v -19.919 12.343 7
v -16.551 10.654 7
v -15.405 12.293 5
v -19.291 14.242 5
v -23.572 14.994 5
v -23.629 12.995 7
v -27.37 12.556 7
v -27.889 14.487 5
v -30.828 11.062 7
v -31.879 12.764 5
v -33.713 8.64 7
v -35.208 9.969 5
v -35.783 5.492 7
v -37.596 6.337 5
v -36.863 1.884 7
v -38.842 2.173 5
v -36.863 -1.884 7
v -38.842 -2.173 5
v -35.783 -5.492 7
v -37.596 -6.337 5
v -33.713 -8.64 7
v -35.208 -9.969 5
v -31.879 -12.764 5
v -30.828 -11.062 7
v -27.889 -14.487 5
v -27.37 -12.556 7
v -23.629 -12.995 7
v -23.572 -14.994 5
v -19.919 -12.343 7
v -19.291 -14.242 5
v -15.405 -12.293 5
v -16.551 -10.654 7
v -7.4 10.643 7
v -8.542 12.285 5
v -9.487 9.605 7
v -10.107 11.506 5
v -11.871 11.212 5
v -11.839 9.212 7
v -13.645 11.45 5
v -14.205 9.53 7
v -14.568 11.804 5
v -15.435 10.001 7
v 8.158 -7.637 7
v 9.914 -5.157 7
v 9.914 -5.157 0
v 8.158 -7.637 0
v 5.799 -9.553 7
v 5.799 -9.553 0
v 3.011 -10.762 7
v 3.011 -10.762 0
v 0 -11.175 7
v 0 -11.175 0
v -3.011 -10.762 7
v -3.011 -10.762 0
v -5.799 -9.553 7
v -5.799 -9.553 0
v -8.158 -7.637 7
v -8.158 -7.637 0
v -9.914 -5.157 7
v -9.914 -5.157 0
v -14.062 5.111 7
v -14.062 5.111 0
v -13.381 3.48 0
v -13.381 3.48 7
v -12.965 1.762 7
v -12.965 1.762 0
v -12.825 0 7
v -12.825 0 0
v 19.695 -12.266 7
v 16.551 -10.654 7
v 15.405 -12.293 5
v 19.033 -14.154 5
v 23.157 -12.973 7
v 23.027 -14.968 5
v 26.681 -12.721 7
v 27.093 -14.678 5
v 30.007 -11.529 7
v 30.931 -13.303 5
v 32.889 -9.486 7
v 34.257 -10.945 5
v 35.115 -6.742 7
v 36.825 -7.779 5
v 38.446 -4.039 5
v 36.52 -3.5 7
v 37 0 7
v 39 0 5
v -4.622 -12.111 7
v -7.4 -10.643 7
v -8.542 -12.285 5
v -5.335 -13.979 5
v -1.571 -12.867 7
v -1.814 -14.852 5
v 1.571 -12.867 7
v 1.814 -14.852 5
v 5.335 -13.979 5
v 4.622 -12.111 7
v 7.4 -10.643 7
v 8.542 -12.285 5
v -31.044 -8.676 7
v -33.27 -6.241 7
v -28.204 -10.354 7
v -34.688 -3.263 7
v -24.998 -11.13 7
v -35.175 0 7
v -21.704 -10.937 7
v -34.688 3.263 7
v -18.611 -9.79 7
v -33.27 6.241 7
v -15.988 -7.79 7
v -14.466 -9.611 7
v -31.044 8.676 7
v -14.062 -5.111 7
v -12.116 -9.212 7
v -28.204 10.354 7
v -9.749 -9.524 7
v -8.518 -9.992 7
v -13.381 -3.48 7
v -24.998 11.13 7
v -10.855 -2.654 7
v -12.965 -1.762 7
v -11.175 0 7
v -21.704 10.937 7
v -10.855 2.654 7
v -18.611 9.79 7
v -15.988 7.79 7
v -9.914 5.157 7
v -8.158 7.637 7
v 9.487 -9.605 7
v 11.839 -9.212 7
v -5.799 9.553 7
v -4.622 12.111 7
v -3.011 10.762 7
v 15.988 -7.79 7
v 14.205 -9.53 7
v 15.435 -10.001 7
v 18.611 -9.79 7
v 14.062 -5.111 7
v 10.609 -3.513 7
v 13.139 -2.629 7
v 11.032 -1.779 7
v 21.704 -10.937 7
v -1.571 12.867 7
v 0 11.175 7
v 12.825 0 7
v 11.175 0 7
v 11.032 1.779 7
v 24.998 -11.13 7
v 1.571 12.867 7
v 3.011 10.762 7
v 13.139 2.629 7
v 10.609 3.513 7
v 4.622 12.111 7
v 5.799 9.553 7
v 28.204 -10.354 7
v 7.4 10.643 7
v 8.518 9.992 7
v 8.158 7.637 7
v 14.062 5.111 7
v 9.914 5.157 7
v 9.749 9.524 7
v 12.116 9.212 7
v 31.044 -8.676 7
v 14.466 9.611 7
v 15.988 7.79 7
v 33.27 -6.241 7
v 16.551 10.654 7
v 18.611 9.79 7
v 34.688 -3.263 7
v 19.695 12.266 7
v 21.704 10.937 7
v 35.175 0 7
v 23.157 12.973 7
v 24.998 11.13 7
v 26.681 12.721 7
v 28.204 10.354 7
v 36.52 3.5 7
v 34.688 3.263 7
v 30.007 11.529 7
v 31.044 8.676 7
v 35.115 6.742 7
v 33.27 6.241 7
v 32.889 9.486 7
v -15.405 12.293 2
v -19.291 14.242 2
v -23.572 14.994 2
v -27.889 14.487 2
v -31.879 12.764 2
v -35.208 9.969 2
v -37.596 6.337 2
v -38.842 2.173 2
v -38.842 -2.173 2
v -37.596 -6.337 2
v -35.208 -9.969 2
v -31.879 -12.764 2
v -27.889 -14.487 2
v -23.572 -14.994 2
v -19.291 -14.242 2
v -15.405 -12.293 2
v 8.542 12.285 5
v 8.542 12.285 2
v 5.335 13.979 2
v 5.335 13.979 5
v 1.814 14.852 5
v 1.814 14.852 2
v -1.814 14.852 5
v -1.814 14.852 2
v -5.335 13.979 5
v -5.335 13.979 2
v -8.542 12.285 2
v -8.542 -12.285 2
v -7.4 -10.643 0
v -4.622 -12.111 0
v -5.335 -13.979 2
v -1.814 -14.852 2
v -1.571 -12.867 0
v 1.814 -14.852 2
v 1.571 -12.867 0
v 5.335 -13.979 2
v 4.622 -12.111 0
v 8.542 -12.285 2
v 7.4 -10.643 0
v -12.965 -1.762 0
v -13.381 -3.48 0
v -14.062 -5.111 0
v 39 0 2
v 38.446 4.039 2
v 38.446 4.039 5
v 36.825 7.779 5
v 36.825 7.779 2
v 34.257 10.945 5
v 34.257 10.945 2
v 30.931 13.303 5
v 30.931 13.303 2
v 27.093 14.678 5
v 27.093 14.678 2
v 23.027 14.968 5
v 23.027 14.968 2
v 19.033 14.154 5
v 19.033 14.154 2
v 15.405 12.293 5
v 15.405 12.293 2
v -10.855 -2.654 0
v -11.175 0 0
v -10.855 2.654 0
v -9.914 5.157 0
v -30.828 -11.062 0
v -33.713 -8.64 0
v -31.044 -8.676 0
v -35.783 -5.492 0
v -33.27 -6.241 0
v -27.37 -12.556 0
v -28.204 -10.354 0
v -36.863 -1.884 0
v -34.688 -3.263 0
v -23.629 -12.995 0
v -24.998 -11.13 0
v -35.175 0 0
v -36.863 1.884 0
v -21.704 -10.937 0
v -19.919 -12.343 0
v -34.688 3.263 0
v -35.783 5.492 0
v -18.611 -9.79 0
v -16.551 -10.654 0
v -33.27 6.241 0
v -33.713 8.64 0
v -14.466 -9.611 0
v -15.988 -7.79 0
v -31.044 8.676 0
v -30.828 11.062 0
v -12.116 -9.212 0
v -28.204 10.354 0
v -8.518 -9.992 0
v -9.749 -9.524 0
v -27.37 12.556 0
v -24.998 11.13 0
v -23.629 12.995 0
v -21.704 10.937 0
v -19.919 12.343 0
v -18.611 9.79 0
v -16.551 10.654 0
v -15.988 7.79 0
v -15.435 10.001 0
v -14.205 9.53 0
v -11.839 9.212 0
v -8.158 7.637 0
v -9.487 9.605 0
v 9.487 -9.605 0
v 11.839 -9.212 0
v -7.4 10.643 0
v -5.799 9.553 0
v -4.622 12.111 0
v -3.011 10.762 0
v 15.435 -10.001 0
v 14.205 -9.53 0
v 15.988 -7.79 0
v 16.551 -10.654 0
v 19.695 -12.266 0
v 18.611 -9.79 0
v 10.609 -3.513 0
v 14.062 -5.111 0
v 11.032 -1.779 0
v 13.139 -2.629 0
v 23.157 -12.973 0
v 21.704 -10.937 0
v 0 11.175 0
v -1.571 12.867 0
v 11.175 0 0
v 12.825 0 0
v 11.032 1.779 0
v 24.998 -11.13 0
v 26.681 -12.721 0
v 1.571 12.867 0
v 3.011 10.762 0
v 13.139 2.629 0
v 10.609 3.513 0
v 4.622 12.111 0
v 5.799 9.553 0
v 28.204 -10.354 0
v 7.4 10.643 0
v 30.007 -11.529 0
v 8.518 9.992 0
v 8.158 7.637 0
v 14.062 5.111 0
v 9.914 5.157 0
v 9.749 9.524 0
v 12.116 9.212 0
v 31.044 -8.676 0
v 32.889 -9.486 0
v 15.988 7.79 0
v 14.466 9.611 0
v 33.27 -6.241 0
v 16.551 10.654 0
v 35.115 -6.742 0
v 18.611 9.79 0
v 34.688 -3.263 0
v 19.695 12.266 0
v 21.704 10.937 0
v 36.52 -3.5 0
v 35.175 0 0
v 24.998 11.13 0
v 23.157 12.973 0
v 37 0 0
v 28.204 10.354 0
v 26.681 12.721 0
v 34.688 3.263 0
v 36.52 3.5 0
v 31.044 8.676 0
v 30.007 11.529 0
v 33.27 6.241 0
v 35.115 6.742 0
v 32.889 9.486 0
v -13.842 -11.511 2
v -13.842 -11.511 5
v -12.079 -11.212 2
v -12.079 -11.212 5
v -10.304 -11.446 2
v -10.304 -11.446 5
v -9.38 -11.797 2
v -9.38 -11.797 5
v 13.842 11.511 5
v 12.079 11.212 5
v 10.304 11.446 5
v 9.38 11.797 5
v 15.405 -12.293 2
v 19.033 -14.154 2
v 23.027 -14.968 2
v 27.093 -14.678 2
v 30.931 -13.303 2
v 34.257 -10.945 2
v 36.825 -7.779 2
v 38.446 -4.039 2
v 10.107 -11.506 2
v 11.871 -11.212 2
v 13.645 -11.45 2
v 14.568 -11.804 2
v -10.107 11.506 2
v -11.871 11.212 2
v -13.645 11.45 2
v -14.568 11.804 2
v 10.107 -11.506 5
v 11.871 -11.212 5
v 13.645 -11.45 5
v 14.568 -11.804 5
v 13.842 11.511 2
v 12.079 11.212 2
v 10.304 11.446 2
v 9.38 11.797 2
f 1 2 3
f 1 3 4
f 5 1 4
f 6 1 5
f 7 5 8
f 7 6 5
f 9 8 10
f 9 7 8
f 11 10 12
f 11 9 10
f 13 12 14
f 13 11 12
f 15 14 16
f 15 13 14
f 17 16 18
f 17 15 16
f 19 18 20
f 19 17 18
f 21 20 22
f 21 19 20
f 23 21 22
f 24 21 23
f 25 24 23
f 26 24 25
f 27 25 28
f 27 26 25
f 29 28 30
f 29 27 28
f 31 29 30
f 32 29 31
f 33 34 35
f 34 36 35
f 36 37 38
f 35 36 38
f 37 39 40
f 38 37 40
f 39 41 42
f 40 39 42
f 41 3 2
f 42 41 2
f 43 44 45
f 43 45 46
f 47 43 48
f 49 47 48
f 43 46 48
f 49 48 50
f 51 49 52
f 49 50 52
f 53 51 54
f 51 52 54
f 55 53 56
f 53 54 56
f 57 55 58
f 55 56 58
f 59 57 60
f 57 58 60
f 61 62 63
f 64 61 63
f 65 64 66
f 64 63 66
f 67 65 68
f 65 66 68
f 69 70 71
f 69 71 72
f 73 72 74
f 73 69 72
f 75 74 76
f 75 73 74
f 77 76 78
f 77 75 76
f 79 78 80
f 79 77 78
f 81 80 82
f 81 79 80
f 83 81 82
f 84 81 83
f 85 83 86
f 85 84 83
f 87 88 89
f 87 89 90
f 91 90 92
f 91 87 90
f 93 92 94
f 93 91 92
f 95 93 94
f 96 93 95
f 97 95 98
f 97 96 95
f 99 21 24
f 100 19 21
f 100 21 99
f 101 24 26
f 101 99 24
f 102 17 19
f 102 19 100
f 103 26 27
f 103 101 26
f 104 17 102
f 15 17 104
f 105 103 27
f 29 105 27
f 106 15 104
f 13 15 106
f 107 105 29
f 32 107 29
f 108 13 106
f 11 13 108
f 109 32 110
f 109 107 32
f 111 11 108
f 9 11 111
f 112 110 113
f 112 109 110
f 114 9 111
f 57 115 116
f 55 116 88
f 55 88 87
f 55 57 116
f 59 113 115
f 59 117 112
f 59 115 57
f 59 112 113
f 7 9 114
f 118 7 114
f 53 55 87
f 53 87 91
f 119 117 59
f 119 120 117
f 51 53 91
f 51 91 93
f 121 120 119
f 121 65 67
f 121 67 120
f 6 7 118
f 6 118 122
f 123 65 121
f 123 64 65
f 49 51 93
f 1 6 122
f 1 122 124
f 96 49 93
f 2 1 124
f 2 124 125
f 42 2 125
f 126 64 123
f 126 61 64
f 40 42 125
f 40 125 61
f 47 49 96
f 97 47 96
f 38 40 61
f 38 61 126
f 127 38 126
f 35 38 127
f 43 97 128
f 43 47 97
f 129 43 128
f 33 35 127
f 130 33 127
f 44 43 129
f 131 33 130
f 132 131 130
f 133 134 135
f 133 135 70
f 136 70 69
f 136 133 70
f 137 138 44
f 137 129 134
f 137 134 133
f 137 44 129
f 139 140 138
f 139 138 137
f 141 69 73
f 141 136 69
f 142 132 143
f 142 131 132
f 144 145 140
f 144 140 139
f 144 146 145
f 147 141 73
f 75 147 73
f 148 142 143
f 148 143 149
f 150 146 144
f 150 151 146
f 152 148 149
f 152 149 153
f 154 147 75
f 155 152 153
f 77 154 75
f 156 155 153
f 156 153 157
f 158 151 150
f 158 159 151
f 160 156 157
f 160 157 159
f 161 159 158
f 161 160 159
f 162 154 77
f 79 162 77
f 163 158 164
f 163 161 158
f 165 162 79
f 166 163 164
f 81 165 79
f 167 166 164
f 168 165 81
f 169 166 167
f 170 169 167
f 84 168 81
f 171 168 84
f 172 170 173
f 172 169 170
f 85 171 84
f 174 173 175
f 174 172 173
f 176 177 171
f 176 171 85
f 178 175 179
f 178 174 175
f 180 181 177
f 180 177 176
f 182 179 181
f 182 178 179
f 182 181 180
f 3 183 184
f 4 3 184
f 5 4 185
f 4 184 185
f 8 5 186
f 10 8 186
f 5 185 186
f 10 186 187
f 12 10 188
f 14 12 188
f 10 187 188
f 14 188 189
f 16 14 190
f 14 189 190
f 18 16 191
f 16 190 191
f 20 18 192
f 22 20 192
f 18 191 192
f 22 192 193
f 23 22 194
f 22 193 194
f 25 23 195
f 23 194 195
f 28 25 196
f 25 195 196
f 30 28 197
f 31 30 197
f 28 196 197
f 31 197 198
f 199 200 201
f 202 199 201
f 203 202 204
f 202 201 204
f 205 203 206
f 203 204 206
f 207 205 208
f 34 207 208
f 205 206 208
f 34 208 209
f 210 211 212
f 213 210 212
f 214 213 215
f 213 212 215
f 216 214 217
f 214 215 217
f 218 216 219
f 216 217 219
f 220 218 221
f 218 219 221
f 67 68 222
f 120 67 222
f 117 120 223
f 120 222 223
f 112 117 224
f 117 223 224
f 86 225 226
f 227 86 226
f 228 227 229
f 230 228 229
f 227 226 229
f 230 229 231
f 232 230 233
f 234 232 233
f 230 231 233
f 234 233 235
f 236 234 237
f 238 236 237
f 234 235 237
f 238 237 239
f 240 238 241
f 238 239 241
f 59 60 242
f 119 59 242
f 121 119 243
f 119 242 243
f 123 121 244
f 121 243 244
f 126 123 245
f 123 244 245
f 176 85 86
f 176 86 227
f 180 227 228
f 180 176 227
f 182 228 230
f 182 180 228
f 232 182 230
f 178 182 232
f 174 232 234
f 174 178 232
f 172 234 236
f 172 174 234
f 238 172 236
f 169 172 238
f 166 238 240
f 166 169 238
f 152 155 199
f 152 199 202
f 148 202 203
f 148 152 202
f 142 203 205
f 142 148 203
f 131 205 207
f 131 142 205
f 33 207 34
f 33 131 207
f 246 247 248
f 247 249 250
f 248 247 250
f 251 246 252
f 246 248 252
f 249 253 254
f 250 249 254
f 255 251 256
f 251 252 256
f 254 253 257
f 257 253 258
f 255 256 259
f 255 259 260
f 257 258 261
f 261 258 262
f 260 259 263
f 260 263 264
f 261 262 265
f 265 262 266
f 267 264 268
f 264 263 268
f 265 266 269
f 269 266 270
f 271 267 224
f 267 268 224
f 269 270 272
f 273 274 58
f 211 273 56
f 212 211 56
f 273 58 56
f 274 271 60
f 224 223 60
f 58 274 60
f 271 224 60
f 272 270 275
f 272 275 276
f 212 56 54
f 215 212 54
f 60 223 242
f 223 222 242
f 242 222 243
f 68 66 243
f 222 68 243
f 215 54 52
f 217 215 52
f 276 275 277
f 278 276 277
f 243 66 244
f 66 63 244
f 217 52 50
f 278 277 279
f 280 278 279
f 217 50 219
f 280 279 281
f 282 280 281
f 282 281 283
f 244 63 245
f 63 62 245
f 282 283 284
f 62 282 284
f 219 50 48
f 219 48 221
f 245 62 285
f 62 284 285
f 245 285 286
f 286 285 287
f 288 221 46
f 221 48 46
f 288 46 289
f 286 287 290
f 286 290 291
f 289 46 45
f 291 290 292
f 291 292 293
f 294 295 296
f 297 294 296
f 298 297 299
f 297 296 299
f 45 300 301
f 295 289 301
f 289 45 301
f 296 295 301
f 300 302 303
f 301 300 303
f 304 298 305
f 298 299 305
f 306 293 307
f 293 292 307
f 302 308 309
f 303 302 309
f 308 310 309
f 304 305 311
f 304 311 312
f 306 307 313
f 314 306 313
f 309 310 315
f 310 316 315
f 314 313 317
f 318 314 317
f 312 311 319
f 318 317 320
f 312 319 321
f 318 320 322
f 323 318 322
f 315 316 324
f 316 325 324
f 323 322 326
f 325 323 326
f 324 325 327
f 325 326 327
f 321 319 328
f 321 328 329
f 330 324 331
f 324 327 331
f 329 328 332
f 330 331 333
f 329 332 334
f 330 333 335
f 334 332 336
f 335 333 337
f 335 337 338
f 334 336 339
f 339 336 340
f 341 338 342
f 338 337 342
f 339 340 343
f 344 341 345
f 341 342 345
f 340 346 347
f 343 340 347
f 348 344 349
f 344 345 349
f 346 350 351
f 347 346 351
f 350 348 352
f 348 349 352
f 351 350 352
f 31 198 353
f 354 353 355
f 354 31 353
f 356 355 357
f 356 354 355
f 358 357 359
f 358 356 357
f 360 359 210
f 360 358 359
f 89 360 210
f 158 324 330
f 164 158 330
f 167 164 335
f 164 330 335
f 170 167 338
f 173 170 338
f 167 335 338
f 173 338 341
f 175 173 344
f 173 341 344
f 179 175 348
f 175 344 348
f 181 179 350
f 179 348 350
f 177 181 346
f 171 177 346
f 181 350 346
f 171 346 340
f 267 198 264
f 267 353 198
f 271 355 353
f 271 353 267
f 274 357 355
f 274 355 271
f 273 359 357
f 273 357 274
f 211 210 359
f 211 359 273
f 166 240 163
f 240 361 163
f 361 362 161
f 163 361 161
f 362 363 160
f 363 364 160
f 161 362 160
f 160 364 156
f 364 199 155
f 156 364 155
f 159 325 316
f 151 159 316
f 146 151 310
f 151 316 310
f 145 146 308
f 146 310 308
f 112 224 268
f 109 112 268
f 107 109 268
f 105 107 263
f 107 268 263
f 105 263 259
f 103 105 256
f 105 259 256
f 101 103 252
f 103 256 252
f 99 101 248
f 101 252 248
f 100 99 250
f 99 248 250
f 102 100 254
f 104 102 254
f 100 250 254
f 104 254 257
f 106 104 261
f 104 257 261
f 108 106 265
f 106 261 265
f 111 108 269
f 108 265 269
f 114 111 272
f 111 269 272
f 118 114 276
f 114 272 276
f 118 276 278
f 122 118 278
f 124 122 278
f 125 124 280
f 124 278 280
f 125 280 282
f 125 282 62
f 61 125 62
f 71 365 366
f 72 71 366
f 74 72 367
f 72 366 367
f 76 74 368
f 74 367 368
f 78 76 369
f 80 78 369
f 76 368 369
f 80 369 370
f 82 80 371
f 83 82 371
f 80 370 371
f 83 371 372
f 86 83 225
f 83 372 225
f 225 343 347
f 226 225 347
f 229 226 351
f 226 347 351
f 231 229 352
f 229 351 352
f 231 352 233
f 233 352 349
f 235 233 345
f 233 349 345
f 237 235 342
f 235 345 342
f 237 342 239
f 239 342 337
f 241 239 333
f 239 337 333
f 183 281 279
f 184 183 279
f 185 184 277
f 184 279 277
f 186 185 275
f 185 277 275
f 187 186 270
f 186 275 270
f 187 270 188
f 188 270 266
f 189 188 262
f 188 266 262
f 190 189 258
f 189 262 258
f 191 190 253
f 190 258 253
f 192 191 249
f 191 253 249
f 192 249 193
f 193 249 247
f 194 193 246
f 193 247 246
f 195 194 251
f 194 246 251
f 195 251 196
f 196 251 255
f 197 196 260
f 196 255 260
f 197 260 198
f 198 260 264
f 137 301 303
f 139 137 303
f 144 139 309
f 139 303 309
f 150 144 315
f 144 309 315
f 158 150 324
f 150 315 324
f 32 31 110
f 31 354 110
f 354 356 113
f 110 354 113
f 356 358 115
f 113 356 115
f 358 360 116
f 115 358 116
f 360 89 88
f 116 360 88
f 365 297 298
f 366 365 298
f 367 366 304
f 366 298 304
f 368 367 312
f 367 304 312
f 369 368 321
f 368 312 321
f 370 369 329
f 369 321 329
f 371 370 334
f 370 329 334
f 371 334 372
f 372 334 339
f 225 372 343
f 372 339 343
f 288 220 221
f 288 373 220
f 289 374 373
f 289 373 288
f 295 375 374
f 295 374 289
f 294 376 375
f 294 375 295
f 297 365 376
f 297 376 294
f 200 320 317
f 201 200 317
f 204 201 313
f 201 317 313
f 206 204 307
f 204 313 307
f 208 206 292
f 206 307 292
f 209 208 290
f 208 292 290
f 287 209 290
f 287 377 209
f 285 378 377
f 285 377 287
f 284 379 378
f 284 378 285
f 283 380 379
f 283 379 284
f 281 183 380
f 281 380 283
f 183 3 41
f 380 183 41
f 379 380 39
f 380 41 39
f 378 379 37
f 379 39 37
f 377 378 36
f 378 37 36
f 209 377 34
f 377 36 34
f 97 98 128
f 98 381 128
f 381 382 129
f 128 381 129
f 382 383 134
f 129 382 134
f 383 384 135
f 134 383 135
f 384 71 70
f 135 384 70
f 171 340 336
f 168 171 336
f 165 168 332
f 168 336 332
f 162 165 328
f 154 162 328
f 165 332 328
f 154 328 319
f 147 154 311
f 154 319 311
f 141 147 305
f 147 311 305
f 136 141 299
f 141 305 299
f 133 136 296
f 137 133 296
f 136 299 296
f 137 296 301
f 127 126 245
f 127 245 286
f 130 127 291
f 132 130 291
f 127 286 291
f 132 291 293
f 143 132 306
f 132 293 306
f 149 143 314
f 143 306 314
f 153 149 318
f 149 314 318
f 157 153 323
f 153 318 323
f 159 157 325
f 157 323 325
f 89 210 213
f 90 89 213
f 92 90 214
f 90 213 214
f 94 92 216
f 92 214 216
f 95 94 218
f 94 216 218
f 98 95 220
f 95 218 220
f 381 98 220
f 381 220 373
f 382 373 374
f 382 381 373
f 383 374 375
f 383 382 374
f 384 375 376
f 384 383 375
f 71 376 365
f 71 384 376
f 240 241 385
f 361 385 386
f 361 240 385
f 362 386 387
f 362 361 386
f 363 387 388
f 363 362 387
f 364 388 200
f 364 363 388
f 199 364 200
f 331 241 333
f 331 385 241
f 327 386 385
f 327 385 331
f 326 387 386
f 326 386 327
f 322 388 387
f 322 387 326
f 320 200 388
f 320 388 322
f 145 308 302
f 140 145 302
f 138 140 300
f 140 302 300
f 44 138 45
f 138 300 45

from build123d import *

# Parameters (mm, degrees)
F1_DEPTH = 7
F2_R     = 6
F3_SIZE  = 2


# Not quite as in the source:
# - a feature names something its author has since deleted; it is built from what else it names


with BuildPart() as f1:
    # F0 (on Top) → F1 (new body)
    with BuildSketch(Plane.XY):
        with BuildLine():
            ThreePointArc((-14.0623969756, 5.1112299037), (-13.1615738007, 7.1167868393), (-11.9765766631, 8.9686839202))
            ThreePointArc((-11.9765766631, 8.9686839202), (-39, 0), (-11.9765766631, -8.9686839202))
            ThreePointArc((-11.9765766631, -8.9686839202), (-13.1615738007, -7.1167868393), (-14.0623969756, -5.1112299037))
            ThreePointArc((-14.0623969756, -5.1112299037), (-35.175, 0), (-14.0623969756, 5.1112299037))
        make_face()
        with BuildLine():
            ThreePointArc((-9.9141796875, -5.1565168597), (-11.175, 0), (-9.9141796875, 5.1565168597))
            ThreePointArc((-9.9141796875, 5.1565168597), (-10.8069599633, 7.1374851726), (-11.9765766631, 8.9686839202))
            ThreePointArc((-11.9765766631, 8.9686839202), (-13.1615738007, 7.1167868393), (-14.0623969756, 5.1112299037))
            ThreePointArc((-14.0623969756, 5.1112299037), (-13.1387537824, 2.6294401687), (-12.825, 0))
            ThreePointArc((-12.825, 0), (-13.1387537824, -2.6294401687), (-14.0623969756, -5.1112299037))
            ThreePointArc((-14.0623969756, -5.1112299037), (-13.1615738007, -7.1167868393), (-11.9765766631, -8.9686839202))
            ThreePointArc((-11.9765766631, -8.9686839202), (-10.8069599633, -7.1374851726), (-9.9141796875, -5.1565168597))
        make_face()
        with BuildLine():
            ThreePointArc((-9.9141796875, 5.1565168597), (0, 11.175), (9.9141796875, 5.1565168597))
            ThreePointArc((9.9141796875, 5.1565168597), (10.8069599633, 7.1374851726), (11.9765766631, 8.9686839202))
            ThreePointArc((11.9765766631, 8.9686839202), (0, 14.9624757252), (-11.9765766631, 8.9686839202))
            ThreePointArc((-11.9765766631, 8.9686839202), (-10.8069599633, 7.1374851726), (-9.9141796875, 5.1565168597))
        make_face()
        with BuildLine():
            ThreePointArc((9.9141796875, 5.1565168597), (10.8552195512, 2.6542105222), (11.175, 0))
            ThreePointArc((11.175, 0), (10.8552195512, -2.6542105222), (9.9141796875, -5.1565168597))
            ThreePointArc((9.9141796875, -5.1565168597), (10.8069599633, -7.1374851726), (11.9765766631, -8.9686839202))
            ThreePointArc((11.9765766631, -8.9686839202), (13.1615738007, -7.1167868393), (14.0623969756, -5.1112299037))
            ThreePointArc((14.0623969756, -5.1112299037), (12.825, 0), (14.0623969756, 5.1112299037))
            ThreePointArc((14.0623969756, 5.1112299037), (13.1615738007, 7.1167868393), (11.9765766631, 8.9686839202))
            ThreePointArc((11.9765766631, 8.9686839202), (10.8069599633, 7.1374851726), (9.9141796875, 5.1565168597))
        make_face()
        with BuildLine():
            ThreePointArc((39, 0), (28.724862429, 14.2364207239), (11.9765766631, 8.9686839202))
            ThreePointArc((11.9765766631, 8.9686839202), (13.1615738007, 7.1167868393), (14.0623969756, 5.1112299037))
            ThreePointArc((14.0623969756, 5.1112299037), (26.6294401687, 10.8612462176), (35.175, 0))
            ThreePointArc((35.175, 0), (26.6294401687, -10.8612462176), (14.0623969756, -5.1112299037))
            ThreePointArc((14.0623969756, -5.1112299037), (13.1615738007, -7.1167868393), (11.9765766631, -8.9686839202))
            ThreePointArc((11.9765766631, -8.9686839202), (28.724862429, -14.2364207239), (39, 0))
        make_face()
        with BuildLine():
            ThreePointArc((11.9765766631, -8.9686839202), (10.8069599633, -7.1374851726), (9.9141796875, -5.1565168597))
            ThreePointArc((9.9141796875, -5.1565168597), (0, -11.175), (-9.9141796875, -5.1565168597))
            ThreePointArc((-9.9141796875, -5.1565168597), (-10.8069599633, -7.1374851726), (-11.9765766631, -8.9686839202))
            ThreePointArc((-11.9765766631, -8.9686839202), (0, -14.9624757252), (11.9765766631, -8.9686839202))
        make_face()
    extrude(amount=F1_DEPTH)

    # F2
    f2_edges = [f1.edges().sort_by_distance(p)[0] for p in [
        (-11.976577, -8.968684, 3.5),
        (11.976577, -8.968684, 3.5),
        (11.976577, 8.968684, 3.5),
        (-11.976577, 8.968684, 3.5),
    ]]
    fillet(f2_edges, radius=F2_R)

    # F3
    f3_edges = [f1.edges().sort_by_distance(p)[0] for p in [
        (-39, 0, 0),
        (-39, 0, 7),
    ]]
    chamfer(f3_edges, length=F3_SIZE)


solid = f1.part
